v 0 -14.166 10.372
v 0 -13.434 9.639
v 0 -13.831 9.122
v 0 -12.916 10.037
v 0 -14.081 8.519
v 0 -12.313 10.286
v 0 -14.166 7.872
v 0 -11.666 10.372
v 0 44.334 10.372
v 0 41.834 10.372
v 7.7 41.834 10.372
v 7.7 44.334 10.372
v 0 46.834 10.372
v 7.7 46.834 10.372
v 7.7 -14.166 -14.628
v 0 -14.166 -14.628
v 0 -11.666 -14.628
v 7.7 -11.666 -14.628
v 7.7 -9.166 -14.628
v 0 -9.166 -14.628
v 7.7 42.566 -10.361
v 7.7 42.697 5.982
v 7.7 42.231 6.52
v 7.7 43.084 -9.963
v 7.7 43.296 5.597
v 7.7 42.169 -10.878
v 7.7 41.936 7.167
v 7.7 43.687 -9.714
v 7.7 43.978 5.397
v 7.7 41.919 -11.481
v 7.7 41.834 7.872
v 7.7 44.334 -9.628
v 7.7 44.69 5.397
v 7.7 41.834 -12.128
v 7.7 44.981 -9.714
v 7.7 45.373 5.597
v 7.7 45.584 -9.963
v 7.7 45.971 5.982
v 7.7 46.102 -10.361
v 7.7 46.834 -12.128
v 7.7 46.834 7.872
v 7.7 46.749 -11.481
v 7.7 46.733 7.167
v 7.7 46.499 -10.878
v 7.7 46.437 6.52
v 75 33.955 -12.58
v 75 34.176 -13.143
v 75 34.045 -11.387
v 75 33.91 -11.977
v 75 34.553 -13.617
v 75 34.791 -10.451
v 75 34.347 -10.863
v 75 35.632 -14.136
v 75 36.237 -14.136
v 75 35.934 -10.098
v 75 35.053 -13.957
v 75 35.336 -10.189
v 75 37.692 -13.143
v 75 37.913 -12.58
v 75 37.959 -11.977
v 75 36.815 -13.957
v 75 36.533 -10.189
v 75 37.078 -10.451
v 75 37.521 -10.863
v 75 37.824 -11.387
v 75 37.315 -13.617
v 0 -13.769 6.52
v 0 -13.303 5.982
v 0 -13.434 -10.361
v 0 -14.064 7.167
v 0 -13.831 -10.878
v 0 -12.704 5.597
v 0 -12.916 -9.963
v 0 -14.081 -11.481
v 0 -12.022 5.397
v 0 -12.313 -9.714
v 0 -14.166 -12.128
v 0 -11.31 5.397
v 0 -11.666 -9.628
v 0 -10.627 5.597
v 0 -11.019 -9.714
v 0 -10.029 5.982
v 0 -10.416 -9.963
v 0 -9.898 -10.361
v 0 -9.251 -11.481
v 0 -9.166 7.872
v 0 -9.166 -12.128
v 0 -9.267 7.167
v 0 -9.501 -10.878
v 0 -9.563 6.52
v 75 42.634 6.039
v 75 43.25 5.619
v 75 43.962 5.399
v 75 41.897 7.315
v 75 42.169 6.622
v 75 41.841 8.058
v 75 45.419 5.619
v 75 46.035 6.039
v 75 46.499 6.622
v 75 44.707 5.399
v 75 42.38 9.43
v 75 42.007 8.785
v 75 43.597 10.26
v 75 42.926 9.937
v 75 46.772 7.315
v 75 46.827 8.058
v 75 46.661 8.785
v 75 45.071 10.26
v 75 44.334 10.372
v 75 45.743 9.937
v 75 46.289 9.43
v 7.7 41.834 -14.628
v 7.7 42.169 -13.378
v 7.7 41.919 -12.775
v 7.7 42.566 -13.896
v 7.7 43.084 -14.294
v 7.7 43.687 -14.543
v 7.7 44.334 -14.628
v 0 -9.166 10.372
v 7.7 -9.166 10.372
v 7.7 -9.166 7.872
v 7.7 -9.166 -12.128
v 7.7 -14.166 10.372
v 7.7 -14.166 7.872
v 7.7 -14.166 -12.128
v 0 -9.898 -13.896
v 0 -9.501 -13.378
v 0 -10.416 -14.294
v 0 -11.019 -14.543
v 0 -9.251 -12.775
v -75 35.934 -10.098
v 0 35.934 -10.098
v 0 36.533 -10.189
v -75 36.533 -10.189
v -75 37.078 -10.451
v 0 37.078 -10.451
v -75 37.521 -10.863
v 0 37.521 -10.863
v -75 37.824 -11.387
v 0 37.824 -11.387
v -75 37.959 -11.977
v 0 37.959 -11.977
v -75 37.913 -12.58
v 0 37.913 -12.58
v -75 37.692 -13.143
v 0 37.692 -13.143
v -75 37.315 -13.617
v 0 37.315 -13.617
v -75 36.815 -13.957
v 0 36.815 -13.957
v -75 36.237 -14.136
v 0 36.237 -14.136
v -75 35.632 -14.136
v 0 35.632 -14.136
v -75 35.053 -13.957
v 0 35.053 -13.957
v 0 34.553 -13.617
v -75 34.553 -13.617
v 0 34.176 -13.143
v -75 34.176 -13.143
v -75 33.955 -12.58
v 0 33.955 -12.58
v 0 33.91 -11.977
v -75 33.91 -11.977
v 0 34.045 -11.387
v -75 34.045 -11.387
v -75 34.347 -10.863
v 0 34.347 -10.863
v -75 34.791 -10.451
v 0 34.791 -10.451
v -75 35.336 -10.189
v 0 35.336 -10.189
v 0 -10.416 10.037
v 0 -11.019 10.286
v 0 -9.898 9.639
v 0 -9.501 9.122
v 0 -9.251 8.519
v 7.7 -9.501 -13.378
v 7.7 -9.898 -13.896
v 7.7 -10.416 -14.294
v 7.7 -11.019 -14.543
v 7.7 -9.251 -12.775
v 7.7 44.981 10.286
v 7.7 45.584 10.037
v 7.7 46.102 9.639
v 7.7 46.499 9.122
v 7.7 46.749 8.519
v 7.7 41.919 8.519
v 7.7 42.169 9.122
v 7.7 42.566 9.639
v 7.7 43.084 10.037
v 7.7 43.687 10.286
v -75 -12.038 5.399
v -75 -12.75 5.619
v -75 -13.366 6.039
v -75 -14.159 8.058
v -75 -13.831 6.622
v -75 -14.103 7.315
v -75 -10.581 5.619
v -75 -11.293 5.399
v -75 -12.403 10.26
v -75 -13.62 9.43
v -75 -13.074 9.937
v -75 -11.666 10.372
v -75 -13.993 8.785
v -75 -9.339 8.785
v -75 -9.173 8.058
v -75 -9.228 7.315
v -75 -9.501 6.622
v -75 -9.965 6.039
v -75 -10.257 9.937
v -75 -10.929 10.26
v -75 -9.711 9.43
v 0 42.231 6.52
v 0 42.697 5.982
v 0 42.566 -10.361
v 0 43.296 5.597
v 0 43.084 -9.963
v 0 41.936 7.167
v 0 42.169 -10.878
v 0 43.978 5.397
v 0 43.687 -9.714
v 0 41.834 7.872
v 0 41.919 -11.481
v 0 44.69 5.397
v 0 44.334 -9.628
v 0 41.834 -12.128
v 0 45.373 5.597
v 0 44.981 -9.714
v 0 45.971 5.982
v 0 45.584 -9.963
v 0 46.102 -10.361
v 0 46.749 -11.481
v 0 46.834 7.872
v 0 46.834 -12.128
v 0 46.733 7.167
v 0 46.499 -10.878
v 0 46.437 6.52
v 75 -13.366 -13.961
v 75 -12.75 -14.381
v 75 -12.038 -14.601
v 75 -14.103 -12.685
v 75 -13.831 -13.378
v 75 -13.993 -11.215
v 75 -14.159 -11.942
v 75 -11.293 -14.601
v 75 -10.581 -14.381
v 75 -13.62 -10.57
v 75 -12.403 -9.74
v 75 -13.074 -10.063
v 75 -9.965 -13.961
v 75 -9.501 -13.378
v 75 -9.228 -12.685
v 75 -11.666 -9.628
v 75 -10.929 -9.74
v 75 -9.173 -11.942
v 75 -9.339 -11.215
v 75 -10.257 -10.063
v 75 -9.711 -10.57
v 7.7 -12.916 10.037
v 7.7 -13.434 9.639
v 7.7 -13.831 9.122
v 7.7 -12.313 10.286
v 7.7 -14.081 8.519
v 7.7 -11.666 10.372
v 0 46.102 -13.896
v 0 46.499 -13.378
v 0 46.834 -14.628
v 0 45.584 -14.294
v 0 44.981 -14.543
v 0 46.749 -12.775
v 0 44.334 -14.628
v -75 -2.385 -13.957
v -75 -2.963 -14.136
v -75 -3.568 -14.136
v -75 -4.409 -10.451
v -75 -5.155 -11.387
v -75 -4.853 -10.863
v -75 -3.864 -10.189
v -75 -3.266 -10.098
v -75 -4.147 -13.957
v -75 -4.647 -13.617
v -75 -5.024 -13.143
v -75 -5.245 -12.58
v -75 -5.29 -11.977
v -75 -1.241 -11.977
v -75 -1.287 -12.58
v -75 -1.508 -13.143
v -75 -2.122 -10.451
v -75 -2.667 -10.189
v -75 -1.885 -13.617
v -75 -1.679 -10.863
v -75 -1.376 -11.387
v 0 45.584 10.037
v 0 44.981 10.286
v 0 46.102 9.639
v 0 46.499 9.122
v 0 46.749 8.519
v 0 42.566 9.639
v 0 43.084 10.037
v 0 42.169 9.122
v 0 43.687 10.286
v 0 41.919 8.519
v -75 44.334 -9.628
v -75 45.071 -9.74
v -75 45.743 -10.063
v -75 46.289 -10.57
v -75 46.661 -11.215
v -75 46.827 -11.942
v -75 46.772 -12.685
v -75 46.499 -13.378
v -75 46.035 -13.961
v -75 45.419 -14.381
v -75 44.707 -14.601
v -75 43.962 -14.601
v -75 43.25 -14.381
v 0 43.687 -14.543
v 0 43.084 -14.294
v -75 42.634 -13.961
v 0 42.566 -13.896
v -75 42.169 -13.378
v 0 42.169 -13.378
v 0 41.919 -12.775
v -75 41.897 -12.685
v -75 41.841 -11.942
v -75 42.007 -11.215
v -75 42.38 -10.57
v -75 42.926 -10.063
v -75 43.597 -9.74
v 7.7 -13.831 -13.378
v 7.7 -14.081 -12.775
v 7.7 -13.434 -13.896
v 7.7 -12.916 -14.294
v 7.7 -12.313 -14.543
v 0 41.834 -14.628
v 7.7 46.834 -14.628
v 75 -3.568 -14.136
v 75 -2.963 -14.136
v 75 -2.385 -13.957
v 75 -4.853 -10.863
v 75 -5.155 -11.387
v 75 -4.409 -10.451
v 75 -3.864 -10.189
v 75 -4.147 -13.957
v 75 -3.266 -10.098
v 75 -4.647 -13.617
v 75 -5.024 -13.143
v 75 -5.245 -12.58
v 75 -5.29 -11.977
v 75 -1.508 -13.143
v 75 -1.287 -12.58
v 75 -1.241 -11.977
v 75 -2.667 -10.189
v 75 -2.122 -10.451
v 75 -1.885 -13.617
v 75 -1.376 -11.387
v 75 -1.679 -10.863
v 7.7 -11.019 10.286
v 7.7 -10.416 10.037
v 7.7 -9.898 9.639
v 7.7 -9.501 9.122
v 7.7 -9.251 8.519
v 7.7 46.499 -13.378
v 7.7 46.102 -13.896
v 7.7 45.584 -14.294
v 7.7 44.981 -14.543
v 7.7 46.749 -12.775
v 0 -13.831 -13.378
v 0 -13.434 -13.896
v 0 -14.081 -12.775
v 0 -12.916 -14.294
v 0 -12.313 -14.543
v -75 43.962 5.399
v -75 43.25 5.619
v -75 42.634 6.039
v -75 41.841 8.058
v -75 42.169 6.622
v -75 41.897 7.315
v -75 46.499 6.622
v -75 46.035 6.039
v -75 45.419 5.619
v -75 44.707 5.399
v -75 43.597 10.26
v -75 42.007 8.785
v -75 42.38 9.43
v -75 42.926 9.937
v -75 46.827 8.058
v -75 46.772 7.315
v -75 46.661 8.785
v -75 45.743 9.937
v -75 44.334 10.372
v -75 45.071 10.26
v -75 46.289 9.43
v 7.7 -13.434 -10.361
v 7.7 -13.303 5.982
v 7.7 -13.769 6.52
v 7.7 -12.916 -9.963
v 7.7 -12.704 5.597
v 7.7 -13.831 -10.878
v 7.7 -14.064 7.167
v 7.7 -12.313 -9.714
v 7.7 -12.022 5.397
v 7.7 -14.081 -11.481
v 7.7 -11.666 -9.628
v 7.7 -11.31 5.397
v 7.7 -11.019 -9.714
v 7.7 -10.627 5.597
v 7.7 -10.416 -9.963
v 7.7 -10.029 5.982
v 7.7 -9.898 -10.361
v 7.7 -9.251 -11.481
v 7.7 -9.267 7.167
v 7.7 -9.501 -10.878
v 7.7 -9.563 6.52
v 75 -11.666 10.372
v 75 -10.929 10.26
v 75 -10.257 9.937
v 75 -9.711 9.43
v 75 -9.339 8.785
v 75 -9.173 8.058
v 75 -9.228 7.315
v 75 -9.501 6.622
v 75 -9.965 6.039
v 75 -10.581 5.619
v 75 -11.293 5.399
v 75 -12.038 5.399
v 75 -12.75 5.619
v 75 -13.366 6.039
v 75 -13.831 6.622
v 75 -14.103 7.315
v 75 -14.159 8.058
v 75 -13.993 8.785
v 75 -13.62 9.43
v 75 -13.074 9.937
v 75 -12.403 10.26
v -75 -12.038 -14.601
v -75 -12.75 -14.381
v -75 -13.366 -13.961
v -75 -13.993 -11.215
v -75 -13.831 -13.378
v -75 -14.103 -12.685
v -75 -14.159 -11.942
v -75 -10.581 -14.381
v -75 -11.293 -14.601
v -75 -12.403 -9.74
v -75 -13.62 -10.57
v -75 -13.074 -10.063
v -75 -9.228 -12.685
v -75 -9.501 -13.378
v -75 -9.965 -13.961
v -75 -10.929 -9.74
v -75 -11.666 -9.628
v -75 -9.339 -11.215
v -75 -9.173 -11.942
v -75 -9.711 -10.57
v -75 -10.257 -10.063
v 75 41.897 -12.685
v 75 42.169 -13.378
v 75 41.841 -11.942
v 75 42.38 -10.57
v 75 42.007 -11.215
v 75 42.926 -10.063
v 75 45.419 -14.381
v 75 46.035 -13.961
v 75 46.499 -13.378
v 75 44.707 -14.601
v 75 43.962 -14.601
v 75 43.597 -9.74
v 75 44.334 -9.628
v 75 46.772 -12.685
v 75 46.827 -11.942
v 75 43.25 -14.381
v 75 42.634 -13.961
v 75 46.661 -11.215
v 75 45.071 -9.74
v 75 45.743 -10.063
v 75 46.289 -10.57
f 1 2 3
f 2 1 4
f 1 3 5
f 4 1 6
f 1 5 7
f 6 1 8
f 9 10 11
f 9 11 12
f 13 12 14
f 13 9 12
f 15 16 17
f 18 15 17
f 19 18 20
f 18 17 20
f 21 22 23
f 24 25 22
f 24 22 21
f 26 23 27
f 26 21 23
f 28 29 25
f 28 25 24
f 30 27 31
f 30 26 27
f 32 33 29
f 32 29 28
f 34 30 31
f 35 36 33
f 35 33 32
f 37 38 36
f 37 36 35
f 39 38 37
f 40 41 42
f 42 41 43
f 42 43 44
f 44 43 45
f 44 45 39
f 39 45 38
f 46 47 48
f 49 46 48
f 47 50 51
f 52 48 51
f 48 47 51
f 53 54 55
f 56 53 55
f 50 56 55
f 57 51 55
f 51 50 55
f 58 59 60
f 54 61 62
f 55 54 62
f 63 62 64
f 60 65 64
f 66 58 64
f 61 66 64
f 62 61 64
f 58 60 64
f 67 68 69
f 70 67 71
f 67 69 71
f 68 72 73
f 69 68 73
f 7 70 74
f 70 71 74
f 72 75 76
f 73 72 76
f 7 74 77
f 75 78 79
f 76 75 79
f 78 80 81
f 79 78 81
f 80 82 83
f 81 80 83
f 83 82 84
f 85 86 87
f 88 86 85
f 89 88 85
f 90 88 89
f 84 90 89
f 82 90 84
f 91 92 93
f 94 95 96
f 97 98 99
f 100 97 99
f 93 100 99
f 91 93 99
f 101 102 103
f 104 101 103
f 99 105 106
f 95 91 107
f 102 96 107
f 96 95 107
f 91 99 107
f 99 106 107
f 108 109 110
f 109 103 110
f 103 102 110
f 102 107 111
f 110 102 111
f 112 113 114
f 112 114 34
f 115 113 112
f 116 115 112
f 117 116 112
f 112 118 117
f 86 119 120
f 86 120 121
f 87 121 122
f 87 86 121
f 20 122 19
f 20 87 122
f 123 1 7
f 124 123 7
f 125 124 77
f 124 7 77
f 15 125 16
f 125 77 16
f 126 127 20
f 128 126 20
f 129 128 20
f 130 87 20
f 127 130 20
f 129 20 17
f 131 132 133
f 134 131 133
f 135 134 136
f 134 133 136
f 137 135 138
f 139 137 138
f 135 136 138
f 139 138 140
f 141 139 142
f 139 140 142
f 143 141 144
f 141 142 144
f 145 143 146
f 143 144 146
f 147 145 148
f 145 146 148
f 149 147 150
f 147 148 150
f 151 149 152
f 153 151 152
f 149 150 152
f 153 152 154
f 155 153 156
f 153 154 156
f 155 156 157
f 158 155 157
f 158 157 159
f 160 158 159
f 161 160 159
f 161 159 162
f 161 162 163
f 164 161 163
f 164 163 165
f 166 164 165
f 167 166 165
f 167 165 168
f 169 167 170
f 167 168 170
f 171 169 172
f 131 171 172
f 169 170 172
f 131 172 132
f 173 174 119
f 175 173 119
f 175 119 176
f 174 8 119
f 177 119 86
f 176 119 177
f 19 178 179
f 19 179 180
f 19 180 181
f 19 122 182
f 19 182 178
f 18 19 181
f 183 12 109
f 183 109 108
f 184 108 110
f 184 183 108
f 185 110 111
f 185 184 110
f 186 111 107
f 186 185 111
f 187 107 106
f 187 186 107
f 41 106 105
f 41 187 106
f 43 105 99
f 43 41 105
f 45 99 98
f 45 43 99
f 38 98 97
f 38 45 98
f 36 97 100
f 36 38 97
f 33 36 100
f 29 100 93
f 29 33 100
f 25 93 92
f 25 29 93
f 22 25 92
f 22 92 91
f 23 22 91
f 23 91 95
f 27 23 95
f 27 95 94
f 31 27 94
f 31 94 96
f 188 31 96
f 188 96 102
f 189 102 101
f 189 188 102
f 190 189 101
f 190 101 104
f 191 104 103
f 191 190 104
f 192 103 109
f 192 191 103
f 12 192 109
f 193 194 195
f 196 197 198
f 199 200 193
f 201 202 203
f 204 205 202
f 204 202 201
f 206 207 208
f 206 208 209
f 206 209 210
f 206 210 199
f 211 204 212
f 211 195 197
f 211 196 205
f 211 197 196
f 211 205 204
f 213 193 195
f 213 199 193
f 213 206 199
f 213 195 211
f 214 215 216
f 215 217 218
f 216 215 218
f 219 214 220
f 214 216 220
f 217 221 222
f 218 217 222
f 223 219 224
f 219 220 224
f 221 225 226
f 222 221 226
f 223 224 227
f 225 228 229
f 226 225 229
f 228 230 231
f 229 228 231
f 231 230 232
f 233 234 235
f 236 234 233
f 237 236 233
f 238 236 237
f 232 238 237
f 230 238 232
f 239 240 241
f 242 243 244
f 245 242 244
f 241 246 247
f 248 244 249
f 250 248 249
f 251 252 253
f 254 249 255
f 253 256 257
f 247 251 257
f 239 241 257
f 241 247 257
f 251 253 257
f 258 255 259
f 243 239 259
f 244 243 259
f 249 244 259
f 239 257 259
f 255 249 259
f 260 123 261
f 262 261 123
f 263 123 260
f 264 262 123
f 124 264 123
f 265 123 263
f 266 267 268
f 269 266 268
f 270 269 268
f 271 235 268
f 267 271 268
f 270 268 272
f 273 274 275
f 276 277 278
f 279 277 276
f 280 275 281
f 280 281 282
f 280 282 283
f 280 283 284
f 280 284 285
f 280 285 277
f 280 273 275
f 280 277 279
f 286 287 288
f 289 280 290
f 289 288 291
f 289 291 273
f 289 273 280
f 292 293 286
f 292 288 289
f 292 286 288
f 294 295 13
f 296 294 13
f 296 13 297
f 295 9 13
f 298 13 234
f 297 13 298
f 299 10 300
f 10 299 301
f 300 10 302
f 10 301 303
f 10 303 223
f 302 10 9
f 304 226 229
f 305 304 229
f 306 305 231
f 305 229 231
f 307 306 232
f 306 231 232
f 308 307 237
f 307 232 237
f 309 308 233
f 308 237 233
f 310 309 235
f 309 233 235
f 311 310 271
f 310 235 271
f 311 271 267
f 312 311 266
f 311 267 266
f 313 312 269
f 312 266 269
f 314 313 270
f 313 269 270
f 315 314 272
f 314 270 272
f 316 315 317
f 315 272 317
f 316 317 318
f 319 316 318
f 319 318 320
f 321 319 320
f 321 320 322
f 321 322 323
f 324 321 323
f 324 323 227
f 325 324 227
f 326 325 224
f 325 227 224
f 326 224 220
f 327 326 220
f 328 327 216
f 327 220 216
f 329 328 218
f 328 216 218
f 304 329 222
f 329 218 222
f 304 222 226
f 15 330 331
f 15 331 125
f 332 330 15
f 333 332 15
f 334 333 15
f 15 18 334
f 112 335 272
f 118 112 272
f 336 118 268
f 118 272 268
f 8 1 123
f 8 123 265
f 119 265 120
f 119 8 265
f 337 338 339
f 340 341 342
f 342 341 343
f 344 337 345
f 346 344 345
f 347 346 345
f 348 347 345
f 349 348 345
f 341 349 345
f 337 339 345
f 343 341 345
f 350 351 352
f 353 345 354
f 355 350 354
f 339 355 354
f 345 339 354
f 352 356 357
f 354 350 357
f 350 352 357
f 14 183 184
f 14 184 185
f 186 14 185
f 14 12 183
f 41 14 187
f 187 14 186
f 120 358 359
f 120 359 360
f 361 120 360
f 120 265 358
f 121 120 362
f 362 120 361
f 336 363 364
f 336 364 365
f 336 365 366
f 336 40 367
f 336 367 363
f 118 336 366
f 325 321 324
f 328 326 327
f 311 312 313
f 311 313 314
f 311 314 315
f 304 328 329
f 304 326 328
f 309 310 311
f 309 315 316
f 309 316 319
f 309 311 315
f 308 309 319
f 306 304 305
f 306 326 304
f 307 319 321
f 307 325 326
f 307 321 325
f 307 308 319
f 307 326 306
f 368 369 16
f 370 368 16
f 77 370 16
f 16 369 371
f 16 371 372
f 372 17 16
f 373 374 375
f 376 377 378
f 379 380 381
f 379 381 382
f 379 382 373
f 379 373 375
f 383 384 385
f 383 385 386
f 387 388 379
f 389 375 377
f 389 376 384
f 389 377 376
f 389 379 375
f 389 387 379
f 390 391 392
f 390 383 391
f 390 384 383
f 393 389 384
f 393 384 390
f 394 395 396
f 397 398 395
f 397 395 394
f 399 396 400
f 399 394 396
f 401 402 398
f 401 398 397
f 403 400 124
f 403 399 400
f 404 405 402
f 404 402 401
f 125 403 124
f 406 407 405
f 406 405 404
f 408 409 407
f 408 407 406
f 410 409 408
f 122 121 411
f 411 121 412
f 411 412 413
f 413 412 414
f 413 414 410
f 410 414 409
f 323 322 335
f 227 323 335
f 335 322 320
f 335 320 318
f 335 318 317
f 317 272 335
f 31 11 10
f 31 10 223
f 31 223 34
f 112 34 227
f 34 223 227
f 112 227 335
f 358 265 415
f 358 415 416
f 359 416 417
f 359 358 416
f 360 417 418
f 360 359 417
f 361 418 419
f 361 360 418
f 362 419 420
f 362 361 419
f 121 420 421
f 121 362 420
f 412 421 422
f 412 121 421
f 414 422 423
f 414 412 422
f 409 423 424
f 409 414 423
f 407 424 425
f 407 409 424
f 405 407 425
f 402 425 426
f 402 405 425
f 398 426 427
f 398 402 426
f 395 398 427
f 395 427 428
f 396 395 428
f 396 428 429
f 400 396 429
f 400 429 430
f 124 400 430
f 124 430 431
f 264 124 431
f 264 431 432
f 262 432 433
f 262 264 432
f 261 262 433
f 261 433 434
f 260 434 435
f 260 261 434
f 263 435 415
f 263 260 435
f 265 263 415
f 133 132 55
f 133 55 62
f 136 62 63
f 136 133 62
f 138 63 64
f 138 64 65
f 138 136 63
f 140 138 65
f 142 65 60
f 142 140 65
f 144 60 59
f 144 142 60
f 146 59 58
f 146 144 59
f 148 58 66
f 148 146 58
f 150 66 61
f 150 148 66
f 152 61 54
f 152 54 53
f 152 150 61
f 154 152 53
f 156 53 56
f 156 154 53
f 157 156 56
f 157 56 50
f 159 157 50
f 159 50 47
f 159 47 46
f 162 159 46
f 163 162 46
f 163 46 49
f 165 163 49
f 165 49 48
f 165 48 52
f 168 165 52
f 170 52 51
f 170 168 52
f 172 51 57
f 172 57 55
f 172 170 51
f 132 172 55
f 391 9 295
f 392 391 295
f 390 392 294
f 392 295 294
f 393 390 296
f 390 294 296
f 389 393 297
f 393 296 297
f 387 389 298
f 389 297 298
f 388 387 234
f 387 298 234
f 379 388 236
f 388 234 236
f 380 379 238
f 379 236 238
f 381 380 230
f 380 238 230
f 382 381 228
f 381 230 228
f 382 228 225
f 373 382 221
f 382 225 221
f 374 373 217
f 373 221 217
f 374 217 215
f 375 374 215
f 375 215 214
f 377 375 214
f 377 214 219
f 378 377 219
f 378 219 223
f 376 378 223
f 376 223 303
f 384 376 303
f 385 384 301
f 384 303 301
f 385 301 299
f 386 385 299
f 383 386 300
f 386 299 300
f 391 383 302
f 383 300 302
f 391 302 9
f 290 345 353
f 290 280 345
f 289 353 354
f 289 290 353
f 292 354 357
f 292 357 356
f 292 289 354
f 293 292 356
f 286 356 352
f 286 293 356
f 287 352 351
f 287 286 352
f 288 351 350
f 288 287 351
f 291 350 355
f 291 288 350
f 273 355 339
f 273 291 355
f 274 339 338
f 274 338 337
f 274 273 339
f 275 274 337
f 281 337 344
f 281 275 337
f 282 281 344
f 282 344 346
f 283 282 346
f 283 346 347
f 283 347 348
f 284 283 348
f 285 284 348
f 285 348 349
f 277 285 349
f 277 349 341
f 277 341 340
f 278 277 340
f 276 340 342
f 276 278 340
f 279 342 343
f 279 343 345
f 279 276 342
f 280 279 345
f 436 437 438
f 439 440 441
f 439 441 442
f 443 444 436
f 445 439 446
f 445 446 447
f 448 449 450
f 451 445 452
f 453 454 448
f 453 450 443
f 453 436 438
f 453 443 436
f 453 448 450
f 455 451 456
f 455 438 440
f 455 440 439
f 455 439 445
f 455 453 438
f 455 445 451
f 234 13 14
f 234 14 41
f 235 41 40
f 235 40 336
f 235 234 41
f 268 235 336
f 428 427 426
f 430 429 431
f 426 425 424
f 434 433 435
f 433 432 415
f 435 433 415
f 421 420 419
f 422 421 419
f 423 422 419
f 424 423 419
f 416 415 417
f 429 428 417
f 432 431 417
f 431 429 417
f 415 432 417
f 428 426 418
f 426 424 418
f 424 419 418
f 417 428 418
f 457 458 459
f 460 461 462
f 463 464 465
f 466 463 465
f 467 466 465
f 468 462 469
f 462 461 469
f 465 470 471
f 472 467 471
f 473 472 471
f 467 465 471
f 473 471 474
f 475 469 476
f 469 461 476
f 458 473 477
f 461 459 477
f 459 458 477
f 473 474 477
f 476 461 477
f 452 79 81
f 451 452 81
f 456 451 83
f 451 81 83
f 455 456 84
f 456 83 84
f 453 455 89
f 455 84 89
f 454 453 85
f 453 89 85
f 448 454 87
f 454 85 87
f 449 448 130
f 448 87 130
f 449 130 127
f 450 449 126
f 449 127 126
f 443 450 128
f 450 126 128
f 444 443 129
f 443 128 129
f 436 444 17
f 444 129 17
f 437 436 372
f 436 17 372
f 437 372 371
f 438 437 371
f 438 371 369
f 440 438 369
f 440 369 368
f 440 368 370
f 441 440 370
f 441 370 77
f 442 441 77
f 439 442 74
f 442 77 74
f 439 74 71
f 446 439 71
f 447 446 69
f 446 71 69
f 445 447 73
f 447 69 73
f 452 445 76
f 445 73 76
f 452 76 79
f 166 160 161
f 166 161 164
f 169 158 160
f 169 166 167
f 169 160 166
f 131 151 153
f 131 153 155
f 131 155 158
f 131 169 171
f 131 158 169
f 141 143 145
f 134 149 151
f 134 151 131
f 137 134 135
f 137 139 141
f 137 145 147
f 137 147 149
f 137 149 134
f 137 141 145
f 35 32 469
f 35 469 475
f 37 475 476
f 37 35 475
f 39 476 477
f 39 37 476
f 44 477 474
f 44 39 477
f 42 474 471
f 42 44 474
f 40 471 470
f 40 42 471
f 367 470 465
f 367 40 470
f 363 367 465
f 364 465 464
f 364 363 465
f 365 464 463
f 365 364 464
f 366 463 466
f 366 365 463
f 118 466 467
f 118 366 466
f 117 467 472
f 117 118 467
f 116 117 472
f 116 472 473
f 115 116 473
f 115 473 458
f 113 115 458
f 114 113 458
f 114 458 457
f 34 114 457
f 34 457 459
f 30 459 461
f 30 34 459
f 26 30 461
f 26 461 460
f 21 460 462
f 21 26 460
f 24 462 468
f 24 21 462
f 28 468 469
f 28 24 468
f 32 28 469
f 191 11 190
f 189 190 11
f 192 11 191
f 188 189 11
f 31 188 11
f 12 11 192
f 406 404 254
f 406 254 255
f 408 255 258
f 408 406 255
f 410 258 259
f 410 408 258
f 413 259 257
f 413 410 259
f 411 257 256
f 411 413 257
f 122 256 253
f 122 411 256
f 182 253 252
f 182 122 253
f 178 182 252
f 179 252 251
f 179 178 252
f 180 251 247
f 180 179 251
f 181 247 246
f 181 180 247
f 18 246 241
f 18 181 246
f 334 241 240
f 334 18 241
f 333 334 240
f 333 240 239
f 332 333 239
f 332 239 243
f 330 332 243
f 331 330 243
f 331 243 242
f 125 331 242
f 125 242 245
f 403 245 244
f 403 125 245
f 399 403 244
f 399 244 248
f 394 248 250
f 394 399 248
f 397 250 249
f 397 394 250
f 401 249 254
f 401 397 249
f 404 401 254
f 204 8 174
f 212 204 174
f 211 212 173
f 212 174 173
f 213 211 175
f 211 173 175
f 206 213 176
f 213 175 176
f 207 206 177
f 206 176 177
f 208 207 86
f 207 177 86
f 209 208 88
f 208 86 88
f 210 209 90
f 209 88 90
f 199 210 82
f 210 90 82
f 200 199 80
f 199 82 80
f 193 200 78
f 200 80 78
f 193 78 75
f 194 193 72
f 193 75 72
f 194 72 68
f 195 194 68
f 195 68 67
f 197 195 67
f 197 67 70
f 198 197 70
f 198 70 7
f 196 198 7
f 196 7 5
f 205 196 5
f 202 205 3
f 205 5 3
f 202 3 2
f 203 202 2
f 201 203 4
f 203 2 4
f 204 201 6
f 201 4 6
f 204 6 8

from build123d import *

# Parameters (mm, degrees)
CROQUIS1_W                = 25
CROQUIS1_H                = 5
SALIENTE_EXTRUIR1_DEPTH   = 7.7
SALIENTE_EXTRUIR1_2_DEPTH = 7.7
CROQUIS2_R                = 2.5
CROQUIS2_R_2              = 2.03
SALIENTE_EXTRUIR2_DEPTH   = 75


with BuildPart() as part:
    # Croquis1 → Saliente-Extruir1 (new body)
    with BuildSketch(Plane(origin=(0, 0, 0), x_dir=(0, 0, -1), z_dir=(1, 0, 0))):
        with Locations((2.128442445, 44.334232457)):
            Rectangle(CROQUIS1_W, CROQUIS1_H)
    extrude(amount=SALIENTE_EXTRUIR1_DEPTH)



with BuildPart() as body_2:
    # Croquis1 → Saliente-Extruir1 2 (new body)
    with BuildSketch(Plane(origin=(0, 0, 0), x_dir=(0, 0, -1), z_dir=(1, 0, 0))):
        with Locations((2.128442445, -11.665767543)):
            Rectangle(CROQUIS1_W, CROQUIS1_H)
    extrude(amount=SALIENTE_EXTRUIR1_2_DEPTH)


with BuildPart() as part_1:
    add(part.part)

    add(body_2.part)  # Saliente-Extruir2 merges body 2
    # Croquis2 → Saliente-Extruir2 (add, symmetric)
    with BuildSketch(Plane.ZY):
        with Locations((-12.128442445, 44.334232457)):
            Circle(CROQUIS2_R)
        with Locations((7.871557555, 44.334232457)):
            Circle(CROQUIS2_R)
        with Locations((7.871557555, -11.665767543)):
            Circle(CROQUIS2_R)
        with Locations((-12.128442445, -11.665767543)):
            Circle(CROQUIS2_R)
        with Locations((-12.128442445, 35.934232457)):
            Circle(CROQUIS2_R_2)
        with Locations((-12.128442445, -3.265767543)):
            Circle(CROQUIS2_R_2)
    extrude(amount=SALIENTE_EXTRUIR2_DEPTH, both=True)


solid = part_1.part
